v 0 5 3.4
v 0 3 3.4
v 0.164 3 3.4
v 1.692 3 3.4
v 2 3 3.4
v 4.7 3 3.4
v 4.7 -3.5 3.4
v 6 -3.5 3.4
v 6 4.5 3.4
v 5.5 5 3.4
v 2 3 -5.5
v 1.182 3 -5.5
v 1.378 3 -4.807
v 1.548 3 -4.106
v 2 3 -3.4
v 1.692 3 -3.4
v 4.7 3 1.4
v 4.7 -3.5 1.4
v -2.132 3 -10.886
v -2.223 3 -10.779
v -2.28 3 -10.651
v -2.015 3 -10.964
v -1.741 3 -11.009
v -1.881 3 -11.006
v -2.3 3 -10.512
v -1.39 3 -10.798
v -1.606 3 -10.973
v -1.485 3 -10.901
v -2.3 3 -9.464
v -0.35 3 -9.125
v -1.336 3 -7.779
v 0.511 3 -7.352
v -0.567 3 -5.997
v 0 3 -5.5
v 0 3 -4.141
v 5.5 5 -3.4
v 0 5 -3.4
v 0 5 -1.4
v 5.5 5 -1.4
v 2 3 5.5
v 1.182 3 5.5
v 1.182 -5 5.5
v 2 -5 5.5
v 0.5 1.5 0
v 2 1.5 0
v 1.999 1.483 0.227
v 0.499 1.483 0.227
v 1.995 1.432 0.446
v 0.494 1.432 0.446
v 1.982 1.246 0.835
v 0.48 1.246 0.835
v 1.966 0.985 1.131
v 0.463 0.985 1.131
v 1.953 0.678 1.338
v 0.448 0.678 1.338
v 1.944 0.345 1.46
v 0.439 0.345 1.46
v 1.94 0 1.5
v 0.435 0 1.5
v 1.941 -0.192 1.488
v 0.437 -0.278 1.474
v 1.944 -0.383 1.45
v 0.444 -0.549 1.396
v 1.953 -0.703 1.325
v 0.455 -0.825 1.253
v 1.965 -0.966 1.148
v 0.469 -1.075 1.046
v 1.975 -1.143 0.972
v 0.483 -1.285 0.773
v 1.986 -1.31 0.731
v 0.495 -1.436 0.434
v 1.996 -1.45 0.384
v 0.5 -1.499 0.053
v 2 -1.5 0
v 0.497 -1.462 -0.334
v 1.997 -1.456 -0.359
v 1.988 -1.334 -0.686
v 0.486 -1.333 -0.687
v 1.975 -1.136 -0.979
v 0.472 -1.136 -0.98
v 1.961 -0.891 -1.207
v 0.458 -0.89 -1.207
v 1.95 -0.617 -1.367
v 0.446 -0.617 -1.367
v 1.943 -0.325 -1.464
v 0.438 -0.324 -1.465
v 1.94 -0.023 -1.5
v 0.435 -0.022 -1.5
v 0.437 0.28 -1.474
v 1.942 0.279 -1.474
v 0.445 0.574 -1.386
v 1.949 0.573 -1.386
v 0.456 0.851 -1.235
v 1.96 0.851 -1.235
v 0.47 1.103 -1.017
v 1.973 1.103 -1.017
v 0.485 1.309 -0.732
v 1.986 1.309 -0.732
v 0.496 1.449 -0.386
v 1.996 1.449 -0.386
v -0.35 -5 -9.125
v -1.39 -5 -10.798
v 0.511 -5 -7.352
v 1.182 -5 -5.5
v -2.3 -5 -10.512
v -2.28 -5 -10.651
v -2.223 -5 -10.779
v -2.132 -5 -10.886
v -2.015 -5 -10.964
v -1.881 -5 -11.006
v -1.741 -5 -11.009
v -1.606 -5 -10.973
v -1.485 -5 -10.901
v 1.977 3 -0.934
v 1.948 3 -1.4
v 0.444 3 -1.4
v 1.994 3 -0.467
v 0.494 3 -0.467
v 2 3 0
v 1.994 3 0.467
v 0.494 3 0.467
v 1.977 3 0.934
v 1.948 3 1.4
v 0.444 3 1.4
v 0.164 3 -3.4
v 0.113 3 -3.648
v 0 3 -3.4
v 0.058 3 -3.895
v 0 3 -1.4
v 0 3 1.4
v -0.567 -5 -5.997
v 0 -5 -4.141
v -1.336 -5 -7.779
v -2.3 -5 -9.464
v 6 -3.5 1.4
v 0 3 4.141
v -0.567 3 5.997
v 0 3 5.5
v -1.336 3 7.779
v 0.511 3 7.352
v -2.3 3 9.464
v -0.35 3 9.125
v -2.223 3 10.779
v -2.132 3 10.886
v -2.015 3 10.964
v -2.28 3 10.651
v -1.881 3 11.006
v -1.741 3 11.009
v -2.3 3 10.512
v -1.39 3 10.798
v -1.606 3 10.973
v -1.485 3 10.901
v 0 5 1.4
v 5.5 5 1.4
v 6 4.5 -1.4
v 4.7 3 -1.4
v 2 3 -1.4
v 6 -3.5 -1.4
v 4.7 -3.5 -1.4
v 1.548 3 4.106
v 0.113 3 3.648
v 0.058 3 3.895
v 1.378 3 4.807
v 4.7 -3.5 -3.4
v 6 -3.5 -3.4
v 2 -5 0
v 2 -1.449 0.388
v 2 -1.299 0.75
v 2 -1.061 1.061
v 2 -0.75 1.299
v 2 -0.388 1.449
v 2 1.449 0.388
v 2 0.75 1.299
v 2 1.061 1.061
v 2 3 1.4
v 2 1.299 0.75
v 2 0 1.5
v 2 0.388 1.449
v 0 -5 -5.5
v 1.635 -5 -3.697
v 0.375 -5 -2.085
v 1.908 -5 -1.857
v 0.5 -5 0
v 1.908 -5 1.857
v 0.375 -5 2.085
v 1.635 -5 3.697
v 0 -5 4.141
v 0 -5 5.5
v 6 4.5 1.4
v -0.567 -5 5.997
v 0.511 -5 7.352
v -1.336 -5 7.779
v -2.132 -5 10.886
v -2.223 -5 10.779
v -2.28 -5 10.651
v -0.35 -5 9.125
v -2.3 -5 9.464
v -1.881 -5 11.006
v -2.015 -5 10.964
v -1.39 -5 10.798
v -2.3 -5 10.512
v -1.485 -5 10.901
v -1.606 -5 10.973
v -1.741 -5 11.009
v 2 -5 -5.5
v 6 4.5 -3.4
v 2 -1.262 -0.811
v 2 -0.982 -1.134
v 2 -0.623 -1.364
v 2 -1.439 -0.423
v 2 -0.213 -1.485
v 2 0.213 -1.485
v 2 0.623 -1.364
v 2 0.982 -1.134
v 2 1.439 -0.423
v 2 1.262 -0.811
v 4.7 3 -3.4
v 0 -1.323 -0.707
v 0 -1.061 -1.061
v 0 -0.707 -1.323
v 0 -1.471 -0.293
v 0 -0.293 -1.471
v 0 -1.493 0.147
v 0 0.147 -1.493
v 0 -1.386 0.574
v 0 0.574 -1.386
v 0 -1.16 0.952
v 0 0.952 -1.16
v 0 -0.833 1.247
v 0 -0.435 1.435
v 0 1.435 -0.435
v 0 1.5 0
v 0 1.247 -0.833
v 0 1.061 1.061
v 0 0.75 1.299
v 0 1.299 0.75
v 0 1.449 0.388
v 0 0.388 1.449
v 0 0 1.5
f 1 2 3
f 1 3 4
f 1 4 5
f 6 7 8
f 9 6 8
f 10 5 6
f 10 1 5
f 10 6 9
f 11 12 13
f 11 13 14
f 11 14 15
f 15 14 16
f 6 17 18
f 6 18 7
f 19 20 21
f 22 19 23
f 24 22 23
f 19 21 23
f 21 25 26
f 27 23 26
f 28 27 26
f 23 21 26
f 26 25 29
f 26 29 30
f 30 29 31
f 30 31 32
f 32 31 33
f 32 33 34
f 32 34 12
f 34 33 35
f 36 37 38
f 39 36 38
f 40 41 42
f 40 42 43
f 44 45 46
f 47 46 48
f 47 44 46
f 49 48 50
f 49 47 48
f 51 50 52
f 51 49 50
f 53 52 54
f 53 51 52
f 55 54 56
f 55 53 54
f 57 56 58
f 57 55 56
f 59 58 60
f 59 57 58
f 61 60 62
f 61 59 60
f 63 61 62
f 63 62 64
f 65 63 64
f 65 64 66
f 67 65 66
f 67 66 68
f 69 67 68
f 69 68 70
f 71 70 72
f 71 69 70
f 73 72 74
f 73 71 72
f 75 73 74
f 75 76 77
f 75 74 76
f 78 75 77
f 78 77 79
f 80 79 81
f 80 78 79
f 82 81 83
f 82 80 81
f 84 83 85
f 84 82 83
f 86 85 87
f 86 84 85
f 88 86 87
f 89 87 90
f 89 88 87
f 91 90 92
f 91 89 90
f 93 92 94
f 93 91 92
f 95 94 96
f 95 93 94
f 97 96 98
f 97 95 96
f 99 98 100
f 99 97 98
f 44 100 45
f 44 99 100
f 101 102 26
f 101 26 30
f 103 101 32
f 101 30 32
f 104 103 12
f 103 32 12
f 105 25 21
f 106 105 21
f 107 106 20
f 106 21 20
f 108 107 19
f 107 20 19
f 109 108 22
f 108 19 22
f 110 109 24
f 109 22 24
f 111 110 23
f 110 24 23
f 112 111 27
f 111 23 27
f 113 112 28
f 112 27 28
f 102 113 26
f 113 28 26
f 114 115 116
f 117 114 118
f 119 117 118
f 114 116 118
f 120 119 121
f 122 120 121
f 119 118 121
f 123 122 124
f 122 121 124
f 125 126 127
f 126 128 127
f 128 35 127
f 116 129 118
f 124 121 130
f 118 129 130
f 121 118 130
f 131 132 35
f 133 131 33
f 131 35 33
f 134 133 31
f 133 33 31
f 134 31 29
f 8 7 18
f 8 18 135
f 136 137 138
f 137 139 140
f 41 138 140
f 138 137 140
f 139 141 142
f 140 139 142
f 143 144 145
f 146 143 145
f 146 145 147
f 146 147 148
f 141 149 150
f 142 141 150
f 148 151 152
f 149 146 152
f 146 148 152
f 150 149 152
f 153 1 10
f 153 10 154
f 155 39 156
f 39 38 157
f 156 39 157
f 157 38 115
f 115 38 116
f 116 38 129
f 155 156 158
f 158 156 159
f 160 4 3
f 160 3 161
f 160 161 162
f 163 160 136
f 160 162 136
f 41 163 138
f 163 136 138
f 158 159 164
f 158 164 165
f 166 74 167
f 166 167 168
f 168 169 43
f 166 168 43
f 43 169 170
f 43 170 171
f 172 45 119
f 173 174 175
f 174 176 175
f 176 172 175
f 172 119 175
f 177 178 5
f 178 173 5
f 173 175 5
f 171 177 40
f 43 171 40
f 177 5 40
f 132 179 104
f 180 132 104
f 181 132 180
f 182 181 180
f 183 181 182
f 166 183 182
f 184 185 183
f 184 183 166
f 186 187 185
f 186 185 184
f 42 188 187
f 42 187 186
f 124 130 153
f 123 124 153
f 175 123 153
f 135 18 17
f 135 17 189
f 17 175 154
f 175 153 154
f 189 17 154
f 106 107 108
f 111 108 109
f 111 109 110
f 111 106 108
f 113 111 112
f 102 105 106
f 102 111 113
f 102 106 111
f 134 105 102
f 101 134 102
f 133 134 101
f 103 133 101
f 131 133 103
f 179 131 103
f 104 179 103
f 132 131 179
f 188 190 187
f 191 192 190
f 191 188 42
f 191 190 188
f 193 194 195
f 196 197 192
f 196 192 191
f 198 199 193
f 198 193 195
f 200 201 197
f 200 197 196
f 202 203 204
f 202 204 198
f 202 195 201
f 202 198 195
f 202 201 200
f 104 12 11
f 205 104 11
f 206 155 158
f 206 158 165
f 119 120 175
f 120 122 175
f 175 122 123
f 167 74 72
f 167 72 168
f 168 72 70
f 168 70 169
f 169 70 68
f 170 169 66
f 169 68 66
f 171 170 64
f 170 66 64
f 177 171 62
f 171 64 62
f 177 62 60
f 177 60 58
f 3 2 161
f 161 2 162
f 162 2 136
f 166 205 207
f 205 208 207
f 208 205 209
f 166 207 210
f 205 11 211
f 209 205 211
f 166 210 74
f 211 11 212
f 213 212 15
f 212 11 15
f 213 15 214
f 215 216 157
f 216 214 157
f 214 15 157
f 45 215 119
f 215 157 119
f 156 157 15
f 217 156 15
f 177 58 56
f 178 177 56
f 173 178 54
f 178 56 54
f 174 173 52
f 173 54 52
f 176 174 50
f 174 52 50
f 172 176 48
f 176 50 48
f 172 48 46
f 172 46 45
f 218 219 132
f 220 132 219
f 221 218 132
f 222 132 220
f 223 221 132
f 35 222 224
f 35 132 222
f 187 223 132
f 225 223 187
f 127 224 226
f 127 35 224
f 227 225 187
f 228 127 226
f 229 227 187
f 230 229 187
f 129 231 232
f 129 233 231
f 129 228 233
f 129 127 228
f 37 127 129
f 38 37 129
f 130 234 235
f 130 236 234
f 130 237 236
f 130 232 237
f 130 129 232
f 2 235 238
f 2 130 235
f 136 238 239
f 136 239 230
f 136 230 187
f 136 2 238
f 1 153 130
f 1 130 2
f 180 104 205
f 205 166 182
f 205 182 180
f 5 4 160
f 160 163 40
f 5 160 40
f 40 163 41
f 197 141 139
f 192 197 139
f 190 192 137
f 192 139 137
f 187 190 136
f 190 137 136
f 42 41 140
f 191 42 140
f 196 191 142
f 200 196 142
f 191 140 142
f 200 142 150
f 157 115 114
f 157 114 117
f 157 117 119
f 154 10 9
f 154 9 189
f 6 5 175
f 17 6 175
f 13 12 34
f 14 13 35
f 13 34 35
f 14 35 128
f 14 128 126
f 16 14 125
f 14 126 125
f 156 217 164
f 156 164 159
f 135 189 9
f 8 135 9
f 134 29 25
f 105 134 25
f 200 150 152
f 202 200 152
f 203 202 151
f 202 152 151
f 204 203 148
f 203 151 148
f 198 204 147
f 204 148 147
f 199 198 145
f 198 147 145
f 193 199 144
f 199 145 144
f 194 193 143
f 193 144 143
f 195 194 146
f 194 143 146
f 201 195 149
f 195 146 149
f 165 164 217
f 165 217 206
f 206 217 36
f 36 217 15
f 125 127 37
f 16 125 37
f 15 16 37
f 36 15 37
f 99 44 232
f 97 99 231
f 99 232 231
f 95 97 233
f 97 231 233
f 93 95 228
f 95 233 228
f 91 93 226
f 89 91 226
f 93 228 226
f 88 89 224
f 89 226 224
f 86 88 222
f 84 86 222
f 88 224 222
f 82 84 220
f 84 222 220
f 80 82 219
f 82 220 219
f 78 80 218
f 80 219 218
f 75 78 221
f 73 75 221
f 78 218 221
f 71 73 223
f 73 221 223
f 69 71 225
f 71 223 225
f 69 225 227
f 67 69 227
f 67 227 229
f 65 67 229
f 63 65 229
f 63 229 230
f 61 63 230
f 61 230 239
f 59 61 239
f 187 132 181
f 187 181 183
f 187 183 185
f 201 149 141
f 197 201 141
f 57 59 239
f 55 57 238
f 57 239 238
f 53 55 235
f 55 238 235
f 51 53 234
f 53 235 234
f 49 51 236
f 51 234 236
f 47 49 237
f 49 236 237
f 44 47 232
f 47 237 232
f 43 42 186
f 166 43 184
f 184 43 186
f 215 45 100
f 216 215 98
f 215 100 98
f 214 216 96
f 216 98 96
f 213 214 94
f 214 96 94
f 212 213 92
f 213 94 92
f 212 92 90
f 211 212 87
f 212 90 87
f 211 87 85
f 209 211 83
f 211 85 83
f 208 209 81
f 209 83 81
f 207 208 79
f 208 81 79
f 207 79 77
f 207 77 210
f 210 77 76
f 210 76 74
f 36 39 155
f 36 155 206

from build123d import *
from build123d.topology import SkipClean

# Parameters (mm, degrees)
EXTRUDE_1_DEPTH      = 2
SKETCH_3_W           = 2
SKETCH_3_H           = 2
EXTRUDE_3_DEPTH      = 4
SKETCH_4_W           = 1.3
SKETCH_4_H           = 2
EXTRUDE_4_DEPTH      = 6.5
SKETCH_5_W           = 2
SKETCH_5_H           = 11
EXTRUDE_5_DEPTH      = 2
CHAMFER_1_SIZE       = 0.5
SKETCH_6_R           = 1.5
CUT_EXTRUDE_1_DEPTH  = 2
EXTRUDE_6_DEPTH      = 2
EXTRUDE_6_DEPTH_BACK = 6
CUT_EXTRUDE_START    = -2
CUT_EXTRUDE_2_DEPTH  = 2


with BuildPart() as part:
    # 草图1 → 凸台-拉伸1 (new body)
    with BuildSketch(Plane(origin=(0, 0, 0), x_dir=(0, 0, -1), z_dir=(1, 0, 0))):
        Polygon((-5.5, -3), (5.5, -3), (5.5, 3), (3.4, 3), (3.4, 5), (1.4, 5), (1.4, 3), (-1.4, 3), (-1.4, 5), (-3.4, 5), (-3.4, 3), (-5.5, 3), align=None)
    extrude(amount=EXTRUDE_1_DEPTH)

    # 草图3 → 凸台-拉伸3 (add)
    with BuildSketch(Plane(origin=(2, 0, 0), x_dir=(0, 0, -1), z_dir=(1, 0, 0))):
        with Locations((-2.4, 4)):
            Rectangle(SKETCH_3_W, SKETCH_3_H)
        with Locations((2.4, 4)):
            Rectangle(SKETCH_3_W, SKETCH_3_H)
    extrude(amount=EXTRUDE_3_DEPTH)

    # 草图4 → 凸台-拉伸4 (add)
    with BuildSketch(Plane.XZ.offset(-3)):
        with Locations((5.35, 2.4)):
            Rectangle(SKETCH_4_W, SKETCH_4_H)
        with Locations((5.35, -2.4)):
            Rectangle(SKETCH_4_W, SKETCH_4_H)
    extrude(amount=EXTRUDE_4_DEPTH)

    # 草图5 → 凸台-拉伸5 (add)
    with BuildSketch(Plane.XZ.offset(3)):
        with Locations((1, 0)):
            Rectangle(SKETCH_5_W, SKETCH_5_H)
    extrude(amount=EXTRUDE_5_DEPTH)

    # 倒角1
    chamfer_1_edges = [part.edges().sort_by_distance(p)[0] for p in [
        (6, 5, -2.4),
        (6, 5, 2.4),
    ]]
    chamfer(chamfer_1_edges, length=CHAMFER_1_SIZE)

    # 草图6 → 切除-拉伸1 (cut)
    with BuildSketch(Plane.ZY):
        Circle(SKETCH_6_R)
    extrude(amount=-CUT_EXTRUDE_1_DEPTH, mode=Mode.SUBTRACT)

    # 草图2 → 凸台-拉伸6 (add, two sides: drawn at the far end of the back side and taken through both)
    with SkipClean():  # the faces are left unmerged after this step: merging them gives an invalid solid
        with BuildSketch(Plane.XZ.offset(3).offset(-EXTRUDE_6_DEPTH_BACK)):
            with BuildLine():
                Line((-2.3, 10.512451089), (-2.3, 9.464007706))
                ThreePointArc((-2.3, 9.464007706), (0.5, 0), (-2.3, -9.464007706))
                Line((-2.3, -9.464007706), (-2.3, -10.512451089))
                ThreePointArc((-2.3, -10.512451089), (-1.949751675, -10.989498714), (-1.389702257, -10.798205813))
                ThreePointArc((-1.389702257, -10.798205813), (2, 0), (-1.389702257, 10.798205813))
                ThreePointArc((-1.389702257, 10.798205813), (-1.949751675, 10.989498714), (-2.3, 10.512451089))
            make_face()
        extrude(amount=EXTRUDE_6_DEPTH + EXTRUDE_6_DEPTH_BACK)

    # 草图7 → 切除-拉伸2 (cut)
    with SkipClean():  # the faces are left unmerged after this step: merging them gives an invalid solid
        with BuildSketch(Plane(origin=(2, 0, 0), x_dir=(0, 0, -1), z_dir=(1, 0, 0)).offset(CUT_EXTRUDE_START)):
            with BuildLine():
                ThreePointArc((0, -1.5), (1.5, 0), (0, 1.5))
                ThreePointArc((0, 1.5), (-1.5, 0), (0, -1.5))
            make_face()
        extrude(amount=CUT_EXTRUDE_2_DEPTH, mode=Mode.SUBTRACT)


solid = part.part
